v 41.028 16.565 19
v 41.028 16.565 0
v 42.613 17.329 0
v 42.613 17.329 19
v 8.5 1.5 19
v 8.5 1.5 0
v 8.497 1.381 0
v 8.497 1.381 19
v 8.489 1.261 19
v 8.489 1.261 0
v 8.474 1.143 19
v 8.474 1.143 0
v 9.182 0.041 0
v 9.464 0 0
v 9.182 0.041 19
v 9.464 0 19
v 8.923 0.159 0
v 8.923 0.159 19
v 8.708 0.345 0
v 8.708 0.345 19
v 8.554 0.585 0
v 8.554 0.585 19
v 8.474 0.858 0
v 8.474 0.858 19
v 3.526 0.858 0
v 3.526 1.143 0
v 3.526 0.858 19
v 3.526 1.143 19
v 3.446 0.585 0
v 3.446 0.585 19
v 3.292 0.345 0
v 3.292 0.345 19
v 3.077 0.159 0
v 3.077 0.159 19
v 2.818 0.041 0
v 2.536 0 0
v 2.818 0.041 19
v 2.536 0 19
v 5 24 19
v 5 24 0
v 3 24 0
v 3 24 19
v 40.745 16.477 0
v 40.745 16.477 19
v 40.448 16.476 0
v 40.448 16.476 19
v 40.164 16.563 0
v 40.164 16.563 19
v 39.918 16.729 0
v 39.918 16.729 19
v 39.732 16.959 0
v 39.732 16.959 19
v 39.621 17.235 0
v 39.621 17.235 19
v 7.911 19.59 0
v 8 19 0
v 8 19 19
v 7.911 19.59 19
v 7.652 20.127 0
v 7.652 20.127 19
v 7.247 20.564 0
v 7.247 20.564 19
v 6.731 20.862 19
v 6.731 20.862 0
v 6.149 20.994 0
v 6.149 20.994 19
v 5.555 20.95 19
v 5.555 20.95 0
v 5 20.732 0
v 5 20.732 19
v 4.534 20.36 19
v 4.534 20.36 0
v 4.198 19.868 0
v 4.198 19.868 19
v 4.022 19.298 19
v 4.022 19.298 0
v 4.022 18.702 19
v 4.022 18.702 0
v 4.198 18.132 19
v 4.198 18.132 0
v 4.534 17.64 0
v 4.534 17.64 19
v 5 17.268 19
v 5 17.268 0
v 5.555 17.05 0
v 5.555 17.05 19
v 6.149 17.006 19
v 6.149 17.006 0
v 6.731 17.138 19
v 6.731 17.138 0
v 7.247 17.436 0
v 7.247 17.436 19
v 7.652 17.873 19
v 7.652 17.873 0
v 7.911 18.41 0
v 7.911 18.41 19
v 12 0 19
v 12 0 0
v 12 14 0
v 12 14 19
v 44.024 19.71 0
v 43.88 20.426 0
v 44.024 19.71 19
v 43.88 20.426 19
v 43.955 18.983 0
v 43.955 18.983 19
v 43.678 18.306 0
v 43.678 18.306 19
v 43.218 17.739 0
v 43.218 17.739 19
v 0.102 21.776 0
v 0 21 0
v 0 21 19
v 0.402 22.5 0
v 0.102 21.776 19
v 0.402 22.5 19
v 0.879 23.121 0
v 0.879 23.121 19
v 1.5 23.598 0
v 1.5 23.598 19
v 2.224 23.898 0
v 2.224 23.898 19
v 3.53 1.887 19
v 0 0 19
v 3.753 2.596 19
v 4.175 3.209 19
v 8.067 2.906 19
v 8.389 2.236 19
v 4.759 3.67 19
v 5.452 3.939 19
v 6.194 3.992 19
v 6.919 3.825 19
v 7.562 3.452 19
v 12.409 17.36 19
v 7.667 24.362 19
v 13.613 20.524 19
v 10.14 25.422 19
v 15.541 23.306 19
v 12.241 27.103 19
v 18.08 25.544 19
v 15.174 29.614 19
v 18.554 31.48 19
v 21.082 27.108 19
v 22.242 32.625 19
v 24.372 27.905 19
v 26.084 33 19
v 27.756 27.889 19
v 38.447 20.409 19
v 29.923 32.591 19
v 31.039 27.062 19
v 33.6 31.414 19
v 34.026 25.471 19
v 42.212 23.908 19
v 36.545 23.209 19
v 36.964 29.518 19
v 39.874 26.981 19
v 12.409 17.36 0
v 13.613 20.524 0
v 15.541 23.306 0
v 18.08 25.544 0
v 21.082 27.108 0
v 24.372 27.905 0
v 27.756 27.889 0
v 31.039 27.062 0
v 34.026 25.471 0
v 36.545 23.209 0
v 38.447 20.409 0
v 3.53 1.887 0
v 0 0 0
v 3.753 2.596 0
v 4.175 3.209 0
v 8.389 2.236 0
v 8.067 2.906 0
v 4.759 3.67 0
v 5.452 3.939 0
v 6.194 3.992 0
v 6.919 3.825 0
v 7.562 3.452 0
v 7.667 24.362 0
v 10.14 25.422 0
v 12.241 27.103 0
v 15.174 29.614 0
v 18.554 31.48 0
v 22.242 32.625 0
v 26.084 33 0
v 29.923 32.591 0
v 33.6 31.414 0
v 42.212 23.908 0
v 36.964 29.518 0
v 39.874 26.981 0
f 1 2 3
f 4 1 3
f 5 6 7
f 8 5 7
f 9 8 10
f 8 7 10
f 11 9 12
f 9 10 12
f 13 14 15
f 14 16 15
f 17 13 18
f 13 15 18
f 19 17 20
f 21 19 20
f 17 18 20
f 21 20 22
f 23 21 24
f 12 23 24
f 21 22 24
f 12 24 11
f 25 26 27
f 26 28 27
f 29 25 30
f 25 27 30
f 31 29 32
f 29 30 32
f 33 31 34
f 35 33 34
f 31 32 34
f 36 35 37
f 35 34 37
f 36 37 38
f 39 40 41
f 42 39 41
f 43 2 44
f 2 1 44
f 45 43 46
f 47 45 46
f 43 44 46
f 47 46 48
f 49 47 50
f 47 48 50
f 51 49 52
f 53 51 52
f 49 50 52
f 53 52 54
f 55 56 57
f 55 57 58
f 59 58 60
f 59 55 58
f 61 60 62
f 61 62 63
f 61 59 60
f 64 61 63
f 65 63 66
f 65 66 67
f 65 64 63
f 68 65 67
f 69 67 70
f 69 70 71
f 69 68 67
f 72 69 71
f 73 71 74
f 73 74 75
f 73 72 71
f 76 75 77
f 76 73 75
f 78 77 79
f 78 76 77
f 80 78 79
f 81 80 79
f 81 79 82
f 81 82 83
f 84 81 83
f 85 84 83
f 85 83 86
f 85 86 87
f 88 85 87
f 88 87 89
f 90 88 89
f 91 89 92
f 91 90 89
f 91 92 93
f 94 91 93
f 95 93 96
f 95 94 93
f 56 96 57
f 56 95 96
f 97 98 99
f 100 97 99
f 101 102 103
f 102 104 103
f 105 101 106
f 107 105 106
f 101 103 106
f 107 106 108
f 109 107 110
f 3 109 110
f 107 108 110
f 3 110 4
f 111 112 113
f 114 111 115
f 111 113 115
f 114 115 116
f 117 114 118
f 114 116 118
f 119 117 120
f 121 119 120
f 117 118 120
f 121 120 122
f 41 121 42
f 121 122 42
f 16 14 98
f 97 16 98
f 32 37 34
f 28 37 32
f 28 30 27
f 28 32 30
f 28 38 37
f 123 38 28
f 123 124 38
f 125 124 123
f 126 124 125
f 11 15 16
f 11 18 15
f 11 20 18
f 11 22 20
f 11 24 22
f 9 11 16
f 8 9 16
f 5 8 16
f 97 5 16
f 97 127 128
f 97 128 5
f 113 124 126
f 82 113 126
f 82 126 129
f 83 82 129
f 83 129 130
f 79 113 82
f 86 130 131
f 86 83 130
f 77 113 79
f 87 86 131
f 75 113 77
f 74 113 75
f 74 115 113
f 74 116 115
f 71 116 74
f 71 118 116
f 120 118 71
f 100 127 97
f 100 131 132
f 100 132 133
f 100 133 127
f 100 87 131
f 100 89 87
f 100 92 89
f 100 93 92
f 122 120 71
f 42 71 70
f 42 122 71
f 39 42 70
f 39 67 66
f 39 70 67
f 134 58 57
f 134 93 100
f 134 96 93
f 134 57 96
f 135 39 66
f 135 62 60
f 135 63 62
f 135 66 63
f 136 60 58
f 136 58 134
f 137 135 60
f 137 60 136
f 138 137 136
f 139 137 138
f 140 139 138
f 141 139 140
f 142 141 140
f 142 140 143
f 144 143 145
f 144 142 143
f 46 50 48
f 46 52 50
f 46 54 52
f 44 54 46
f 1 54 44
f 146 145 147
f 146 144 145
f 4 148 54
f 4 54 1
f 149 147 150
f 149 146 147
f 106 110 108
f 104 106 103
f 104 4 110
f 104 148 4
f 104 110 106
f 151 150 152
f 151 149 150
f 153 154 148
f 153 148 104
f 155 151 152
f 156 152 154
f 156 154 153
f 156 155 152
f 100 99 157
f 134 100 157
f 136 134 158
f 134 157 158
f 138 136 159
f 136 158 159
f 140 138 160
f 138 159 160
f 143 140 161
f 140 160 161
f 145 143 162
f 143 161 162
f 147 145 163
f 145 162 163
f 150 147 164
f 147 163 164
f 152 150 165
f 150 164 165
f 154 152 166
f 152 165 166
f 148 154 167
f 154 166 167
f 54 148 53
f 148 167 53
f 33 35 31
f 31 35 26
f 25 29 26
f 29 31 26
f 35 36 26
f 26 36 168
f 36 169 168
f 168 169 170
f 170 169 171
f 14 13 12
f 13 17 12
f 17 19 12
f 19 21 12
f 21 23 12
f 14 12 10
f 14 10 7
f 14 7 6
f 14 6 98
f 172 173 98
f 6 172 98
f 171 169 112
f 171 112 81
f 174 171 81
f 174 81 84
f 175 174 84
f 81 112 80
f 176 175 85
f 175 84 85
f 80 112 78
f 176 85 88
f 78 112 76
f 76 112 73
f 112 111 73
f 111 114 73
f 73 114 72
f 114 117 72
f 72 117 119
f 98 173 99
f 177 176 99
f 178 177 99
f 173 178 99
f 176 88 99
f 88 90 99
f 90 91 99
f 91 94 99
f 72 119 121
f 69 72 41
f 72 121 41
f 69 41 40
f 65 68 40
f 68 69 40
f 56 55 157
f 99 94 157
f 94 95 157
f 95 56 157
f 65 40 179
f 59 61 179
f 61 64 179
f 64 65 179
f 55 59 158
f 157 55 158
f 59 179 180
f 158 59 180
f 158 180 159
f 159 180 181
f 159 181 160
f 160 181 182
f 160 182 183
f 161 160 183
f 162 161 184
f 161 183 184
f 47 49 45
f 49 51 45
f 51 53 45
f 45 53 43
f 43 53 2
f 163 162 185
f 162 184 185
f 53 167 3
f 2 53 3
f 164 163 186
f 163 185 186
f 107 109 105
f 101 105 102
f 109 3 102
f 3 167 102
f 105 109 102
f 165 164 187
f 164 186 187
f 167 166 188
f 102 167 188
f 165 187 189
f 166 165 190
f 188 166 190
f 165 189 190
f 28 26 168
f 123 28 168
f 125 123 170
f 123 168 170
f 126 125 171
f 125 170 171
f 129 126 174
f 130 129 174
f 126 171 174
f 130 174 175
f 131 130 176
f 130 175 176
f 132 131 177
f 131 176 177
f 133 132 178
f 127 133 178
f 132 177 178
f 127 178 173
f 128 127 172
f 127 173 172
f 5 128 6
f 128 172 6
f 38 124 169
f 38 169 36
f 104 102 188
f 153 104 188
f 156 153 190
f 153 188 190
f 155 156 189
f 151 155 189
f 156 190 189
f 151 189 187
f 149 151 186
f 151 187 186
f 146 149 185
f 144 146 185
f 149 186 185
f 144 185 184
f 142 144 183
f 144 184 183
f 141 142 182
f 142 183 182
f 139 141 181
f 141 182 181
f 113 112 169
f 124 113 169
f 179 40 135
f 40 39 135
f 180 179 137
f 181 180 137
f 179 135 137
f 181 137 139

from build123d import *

# Parameters (mm, degrees)
F0_R     = 2
F1_DEPTH = 19
F2_R     = 3
F3_R     = 10
F4_R     = 2.5
F5_R     = 1
F6_R     = 1


with BuildPart() as f1:
    # F0 (on Top) → F1 (new body)
    with BuildSketch(Plane.XY):
        with BuildLine():
            Line((0, 24), (0, 0))
            Line((0, 0), (4, 0))
            ThreePointArc((4, 0), (5.209430585, 3.8717082451), (8.5, 1.5))
            ThreePointArc((8.5, 1.5), (8.3717082451, 0.709430585), (8, 0))
            Line((8, 0), (12, 0))
            Line((12, 0), (12, 14))
            Line((12, 14), (12, 24))
            Line((12, 24), (9.8445055786, 24))
            Line((9.8445055786, 24), (0, 24))
        make_face()
        with Locations((6, 19)):
            Circle(F0_R, mode=Mode.SUBTRACT)
        with BuildLine():
            ThreePointArc((44.5191347039, 18.2475463293), (29.1095626147, 32.7438155226), (9.8445055786, 24))
            Line((9.8445055786, 24), (12, 24))
            Line((12, 24), (12, 14))
            ThreePointArc((12, 14), (24.9974259249, 27.964055472), (39.8564064606, 16))
            Line((39.8564064606, 16), (44.5191347039, 18.2475463293))
        make_face()
    extrude(amount=F1_DEPTH)

    # F2
    f2_edges = [f1.edges().sort_by_distance(p)[0] for p in [
        (0, 24, 9.5),
    ]]
    fillet(f2_edges, radius=F2_R)

    # F3
    f3_edges = [f1.edges().sort_by_distance(p)[0] for p in [
        (9.844506, 24, 9.5),
    ]]
    fillet(f3_edges, radius=F3_R)

    # F4
    f4_edges = [f1.edges().sort_by_distance(p)[0] for p in [
        (44.519135, 18.247546, 9.5),
    ]]
    fillet(f4_edges, radius=F4_R)

    # F5
    f5_edges = [f1.edges().sort_by_distance(p)[0] for p in [
        (39.856406, 16, 9.5),
    ]]
    fillet(f5_edges, radius=F5_R)

    # F6
    f6_edges = [f1.edges().sort_by_distance(p)[0] for p in [
        (4, 0, 9.5),
        (8, 0, 9.5),
    ]]
    fillet(f6_edges, radius=F6_R)


solid = f1.part
